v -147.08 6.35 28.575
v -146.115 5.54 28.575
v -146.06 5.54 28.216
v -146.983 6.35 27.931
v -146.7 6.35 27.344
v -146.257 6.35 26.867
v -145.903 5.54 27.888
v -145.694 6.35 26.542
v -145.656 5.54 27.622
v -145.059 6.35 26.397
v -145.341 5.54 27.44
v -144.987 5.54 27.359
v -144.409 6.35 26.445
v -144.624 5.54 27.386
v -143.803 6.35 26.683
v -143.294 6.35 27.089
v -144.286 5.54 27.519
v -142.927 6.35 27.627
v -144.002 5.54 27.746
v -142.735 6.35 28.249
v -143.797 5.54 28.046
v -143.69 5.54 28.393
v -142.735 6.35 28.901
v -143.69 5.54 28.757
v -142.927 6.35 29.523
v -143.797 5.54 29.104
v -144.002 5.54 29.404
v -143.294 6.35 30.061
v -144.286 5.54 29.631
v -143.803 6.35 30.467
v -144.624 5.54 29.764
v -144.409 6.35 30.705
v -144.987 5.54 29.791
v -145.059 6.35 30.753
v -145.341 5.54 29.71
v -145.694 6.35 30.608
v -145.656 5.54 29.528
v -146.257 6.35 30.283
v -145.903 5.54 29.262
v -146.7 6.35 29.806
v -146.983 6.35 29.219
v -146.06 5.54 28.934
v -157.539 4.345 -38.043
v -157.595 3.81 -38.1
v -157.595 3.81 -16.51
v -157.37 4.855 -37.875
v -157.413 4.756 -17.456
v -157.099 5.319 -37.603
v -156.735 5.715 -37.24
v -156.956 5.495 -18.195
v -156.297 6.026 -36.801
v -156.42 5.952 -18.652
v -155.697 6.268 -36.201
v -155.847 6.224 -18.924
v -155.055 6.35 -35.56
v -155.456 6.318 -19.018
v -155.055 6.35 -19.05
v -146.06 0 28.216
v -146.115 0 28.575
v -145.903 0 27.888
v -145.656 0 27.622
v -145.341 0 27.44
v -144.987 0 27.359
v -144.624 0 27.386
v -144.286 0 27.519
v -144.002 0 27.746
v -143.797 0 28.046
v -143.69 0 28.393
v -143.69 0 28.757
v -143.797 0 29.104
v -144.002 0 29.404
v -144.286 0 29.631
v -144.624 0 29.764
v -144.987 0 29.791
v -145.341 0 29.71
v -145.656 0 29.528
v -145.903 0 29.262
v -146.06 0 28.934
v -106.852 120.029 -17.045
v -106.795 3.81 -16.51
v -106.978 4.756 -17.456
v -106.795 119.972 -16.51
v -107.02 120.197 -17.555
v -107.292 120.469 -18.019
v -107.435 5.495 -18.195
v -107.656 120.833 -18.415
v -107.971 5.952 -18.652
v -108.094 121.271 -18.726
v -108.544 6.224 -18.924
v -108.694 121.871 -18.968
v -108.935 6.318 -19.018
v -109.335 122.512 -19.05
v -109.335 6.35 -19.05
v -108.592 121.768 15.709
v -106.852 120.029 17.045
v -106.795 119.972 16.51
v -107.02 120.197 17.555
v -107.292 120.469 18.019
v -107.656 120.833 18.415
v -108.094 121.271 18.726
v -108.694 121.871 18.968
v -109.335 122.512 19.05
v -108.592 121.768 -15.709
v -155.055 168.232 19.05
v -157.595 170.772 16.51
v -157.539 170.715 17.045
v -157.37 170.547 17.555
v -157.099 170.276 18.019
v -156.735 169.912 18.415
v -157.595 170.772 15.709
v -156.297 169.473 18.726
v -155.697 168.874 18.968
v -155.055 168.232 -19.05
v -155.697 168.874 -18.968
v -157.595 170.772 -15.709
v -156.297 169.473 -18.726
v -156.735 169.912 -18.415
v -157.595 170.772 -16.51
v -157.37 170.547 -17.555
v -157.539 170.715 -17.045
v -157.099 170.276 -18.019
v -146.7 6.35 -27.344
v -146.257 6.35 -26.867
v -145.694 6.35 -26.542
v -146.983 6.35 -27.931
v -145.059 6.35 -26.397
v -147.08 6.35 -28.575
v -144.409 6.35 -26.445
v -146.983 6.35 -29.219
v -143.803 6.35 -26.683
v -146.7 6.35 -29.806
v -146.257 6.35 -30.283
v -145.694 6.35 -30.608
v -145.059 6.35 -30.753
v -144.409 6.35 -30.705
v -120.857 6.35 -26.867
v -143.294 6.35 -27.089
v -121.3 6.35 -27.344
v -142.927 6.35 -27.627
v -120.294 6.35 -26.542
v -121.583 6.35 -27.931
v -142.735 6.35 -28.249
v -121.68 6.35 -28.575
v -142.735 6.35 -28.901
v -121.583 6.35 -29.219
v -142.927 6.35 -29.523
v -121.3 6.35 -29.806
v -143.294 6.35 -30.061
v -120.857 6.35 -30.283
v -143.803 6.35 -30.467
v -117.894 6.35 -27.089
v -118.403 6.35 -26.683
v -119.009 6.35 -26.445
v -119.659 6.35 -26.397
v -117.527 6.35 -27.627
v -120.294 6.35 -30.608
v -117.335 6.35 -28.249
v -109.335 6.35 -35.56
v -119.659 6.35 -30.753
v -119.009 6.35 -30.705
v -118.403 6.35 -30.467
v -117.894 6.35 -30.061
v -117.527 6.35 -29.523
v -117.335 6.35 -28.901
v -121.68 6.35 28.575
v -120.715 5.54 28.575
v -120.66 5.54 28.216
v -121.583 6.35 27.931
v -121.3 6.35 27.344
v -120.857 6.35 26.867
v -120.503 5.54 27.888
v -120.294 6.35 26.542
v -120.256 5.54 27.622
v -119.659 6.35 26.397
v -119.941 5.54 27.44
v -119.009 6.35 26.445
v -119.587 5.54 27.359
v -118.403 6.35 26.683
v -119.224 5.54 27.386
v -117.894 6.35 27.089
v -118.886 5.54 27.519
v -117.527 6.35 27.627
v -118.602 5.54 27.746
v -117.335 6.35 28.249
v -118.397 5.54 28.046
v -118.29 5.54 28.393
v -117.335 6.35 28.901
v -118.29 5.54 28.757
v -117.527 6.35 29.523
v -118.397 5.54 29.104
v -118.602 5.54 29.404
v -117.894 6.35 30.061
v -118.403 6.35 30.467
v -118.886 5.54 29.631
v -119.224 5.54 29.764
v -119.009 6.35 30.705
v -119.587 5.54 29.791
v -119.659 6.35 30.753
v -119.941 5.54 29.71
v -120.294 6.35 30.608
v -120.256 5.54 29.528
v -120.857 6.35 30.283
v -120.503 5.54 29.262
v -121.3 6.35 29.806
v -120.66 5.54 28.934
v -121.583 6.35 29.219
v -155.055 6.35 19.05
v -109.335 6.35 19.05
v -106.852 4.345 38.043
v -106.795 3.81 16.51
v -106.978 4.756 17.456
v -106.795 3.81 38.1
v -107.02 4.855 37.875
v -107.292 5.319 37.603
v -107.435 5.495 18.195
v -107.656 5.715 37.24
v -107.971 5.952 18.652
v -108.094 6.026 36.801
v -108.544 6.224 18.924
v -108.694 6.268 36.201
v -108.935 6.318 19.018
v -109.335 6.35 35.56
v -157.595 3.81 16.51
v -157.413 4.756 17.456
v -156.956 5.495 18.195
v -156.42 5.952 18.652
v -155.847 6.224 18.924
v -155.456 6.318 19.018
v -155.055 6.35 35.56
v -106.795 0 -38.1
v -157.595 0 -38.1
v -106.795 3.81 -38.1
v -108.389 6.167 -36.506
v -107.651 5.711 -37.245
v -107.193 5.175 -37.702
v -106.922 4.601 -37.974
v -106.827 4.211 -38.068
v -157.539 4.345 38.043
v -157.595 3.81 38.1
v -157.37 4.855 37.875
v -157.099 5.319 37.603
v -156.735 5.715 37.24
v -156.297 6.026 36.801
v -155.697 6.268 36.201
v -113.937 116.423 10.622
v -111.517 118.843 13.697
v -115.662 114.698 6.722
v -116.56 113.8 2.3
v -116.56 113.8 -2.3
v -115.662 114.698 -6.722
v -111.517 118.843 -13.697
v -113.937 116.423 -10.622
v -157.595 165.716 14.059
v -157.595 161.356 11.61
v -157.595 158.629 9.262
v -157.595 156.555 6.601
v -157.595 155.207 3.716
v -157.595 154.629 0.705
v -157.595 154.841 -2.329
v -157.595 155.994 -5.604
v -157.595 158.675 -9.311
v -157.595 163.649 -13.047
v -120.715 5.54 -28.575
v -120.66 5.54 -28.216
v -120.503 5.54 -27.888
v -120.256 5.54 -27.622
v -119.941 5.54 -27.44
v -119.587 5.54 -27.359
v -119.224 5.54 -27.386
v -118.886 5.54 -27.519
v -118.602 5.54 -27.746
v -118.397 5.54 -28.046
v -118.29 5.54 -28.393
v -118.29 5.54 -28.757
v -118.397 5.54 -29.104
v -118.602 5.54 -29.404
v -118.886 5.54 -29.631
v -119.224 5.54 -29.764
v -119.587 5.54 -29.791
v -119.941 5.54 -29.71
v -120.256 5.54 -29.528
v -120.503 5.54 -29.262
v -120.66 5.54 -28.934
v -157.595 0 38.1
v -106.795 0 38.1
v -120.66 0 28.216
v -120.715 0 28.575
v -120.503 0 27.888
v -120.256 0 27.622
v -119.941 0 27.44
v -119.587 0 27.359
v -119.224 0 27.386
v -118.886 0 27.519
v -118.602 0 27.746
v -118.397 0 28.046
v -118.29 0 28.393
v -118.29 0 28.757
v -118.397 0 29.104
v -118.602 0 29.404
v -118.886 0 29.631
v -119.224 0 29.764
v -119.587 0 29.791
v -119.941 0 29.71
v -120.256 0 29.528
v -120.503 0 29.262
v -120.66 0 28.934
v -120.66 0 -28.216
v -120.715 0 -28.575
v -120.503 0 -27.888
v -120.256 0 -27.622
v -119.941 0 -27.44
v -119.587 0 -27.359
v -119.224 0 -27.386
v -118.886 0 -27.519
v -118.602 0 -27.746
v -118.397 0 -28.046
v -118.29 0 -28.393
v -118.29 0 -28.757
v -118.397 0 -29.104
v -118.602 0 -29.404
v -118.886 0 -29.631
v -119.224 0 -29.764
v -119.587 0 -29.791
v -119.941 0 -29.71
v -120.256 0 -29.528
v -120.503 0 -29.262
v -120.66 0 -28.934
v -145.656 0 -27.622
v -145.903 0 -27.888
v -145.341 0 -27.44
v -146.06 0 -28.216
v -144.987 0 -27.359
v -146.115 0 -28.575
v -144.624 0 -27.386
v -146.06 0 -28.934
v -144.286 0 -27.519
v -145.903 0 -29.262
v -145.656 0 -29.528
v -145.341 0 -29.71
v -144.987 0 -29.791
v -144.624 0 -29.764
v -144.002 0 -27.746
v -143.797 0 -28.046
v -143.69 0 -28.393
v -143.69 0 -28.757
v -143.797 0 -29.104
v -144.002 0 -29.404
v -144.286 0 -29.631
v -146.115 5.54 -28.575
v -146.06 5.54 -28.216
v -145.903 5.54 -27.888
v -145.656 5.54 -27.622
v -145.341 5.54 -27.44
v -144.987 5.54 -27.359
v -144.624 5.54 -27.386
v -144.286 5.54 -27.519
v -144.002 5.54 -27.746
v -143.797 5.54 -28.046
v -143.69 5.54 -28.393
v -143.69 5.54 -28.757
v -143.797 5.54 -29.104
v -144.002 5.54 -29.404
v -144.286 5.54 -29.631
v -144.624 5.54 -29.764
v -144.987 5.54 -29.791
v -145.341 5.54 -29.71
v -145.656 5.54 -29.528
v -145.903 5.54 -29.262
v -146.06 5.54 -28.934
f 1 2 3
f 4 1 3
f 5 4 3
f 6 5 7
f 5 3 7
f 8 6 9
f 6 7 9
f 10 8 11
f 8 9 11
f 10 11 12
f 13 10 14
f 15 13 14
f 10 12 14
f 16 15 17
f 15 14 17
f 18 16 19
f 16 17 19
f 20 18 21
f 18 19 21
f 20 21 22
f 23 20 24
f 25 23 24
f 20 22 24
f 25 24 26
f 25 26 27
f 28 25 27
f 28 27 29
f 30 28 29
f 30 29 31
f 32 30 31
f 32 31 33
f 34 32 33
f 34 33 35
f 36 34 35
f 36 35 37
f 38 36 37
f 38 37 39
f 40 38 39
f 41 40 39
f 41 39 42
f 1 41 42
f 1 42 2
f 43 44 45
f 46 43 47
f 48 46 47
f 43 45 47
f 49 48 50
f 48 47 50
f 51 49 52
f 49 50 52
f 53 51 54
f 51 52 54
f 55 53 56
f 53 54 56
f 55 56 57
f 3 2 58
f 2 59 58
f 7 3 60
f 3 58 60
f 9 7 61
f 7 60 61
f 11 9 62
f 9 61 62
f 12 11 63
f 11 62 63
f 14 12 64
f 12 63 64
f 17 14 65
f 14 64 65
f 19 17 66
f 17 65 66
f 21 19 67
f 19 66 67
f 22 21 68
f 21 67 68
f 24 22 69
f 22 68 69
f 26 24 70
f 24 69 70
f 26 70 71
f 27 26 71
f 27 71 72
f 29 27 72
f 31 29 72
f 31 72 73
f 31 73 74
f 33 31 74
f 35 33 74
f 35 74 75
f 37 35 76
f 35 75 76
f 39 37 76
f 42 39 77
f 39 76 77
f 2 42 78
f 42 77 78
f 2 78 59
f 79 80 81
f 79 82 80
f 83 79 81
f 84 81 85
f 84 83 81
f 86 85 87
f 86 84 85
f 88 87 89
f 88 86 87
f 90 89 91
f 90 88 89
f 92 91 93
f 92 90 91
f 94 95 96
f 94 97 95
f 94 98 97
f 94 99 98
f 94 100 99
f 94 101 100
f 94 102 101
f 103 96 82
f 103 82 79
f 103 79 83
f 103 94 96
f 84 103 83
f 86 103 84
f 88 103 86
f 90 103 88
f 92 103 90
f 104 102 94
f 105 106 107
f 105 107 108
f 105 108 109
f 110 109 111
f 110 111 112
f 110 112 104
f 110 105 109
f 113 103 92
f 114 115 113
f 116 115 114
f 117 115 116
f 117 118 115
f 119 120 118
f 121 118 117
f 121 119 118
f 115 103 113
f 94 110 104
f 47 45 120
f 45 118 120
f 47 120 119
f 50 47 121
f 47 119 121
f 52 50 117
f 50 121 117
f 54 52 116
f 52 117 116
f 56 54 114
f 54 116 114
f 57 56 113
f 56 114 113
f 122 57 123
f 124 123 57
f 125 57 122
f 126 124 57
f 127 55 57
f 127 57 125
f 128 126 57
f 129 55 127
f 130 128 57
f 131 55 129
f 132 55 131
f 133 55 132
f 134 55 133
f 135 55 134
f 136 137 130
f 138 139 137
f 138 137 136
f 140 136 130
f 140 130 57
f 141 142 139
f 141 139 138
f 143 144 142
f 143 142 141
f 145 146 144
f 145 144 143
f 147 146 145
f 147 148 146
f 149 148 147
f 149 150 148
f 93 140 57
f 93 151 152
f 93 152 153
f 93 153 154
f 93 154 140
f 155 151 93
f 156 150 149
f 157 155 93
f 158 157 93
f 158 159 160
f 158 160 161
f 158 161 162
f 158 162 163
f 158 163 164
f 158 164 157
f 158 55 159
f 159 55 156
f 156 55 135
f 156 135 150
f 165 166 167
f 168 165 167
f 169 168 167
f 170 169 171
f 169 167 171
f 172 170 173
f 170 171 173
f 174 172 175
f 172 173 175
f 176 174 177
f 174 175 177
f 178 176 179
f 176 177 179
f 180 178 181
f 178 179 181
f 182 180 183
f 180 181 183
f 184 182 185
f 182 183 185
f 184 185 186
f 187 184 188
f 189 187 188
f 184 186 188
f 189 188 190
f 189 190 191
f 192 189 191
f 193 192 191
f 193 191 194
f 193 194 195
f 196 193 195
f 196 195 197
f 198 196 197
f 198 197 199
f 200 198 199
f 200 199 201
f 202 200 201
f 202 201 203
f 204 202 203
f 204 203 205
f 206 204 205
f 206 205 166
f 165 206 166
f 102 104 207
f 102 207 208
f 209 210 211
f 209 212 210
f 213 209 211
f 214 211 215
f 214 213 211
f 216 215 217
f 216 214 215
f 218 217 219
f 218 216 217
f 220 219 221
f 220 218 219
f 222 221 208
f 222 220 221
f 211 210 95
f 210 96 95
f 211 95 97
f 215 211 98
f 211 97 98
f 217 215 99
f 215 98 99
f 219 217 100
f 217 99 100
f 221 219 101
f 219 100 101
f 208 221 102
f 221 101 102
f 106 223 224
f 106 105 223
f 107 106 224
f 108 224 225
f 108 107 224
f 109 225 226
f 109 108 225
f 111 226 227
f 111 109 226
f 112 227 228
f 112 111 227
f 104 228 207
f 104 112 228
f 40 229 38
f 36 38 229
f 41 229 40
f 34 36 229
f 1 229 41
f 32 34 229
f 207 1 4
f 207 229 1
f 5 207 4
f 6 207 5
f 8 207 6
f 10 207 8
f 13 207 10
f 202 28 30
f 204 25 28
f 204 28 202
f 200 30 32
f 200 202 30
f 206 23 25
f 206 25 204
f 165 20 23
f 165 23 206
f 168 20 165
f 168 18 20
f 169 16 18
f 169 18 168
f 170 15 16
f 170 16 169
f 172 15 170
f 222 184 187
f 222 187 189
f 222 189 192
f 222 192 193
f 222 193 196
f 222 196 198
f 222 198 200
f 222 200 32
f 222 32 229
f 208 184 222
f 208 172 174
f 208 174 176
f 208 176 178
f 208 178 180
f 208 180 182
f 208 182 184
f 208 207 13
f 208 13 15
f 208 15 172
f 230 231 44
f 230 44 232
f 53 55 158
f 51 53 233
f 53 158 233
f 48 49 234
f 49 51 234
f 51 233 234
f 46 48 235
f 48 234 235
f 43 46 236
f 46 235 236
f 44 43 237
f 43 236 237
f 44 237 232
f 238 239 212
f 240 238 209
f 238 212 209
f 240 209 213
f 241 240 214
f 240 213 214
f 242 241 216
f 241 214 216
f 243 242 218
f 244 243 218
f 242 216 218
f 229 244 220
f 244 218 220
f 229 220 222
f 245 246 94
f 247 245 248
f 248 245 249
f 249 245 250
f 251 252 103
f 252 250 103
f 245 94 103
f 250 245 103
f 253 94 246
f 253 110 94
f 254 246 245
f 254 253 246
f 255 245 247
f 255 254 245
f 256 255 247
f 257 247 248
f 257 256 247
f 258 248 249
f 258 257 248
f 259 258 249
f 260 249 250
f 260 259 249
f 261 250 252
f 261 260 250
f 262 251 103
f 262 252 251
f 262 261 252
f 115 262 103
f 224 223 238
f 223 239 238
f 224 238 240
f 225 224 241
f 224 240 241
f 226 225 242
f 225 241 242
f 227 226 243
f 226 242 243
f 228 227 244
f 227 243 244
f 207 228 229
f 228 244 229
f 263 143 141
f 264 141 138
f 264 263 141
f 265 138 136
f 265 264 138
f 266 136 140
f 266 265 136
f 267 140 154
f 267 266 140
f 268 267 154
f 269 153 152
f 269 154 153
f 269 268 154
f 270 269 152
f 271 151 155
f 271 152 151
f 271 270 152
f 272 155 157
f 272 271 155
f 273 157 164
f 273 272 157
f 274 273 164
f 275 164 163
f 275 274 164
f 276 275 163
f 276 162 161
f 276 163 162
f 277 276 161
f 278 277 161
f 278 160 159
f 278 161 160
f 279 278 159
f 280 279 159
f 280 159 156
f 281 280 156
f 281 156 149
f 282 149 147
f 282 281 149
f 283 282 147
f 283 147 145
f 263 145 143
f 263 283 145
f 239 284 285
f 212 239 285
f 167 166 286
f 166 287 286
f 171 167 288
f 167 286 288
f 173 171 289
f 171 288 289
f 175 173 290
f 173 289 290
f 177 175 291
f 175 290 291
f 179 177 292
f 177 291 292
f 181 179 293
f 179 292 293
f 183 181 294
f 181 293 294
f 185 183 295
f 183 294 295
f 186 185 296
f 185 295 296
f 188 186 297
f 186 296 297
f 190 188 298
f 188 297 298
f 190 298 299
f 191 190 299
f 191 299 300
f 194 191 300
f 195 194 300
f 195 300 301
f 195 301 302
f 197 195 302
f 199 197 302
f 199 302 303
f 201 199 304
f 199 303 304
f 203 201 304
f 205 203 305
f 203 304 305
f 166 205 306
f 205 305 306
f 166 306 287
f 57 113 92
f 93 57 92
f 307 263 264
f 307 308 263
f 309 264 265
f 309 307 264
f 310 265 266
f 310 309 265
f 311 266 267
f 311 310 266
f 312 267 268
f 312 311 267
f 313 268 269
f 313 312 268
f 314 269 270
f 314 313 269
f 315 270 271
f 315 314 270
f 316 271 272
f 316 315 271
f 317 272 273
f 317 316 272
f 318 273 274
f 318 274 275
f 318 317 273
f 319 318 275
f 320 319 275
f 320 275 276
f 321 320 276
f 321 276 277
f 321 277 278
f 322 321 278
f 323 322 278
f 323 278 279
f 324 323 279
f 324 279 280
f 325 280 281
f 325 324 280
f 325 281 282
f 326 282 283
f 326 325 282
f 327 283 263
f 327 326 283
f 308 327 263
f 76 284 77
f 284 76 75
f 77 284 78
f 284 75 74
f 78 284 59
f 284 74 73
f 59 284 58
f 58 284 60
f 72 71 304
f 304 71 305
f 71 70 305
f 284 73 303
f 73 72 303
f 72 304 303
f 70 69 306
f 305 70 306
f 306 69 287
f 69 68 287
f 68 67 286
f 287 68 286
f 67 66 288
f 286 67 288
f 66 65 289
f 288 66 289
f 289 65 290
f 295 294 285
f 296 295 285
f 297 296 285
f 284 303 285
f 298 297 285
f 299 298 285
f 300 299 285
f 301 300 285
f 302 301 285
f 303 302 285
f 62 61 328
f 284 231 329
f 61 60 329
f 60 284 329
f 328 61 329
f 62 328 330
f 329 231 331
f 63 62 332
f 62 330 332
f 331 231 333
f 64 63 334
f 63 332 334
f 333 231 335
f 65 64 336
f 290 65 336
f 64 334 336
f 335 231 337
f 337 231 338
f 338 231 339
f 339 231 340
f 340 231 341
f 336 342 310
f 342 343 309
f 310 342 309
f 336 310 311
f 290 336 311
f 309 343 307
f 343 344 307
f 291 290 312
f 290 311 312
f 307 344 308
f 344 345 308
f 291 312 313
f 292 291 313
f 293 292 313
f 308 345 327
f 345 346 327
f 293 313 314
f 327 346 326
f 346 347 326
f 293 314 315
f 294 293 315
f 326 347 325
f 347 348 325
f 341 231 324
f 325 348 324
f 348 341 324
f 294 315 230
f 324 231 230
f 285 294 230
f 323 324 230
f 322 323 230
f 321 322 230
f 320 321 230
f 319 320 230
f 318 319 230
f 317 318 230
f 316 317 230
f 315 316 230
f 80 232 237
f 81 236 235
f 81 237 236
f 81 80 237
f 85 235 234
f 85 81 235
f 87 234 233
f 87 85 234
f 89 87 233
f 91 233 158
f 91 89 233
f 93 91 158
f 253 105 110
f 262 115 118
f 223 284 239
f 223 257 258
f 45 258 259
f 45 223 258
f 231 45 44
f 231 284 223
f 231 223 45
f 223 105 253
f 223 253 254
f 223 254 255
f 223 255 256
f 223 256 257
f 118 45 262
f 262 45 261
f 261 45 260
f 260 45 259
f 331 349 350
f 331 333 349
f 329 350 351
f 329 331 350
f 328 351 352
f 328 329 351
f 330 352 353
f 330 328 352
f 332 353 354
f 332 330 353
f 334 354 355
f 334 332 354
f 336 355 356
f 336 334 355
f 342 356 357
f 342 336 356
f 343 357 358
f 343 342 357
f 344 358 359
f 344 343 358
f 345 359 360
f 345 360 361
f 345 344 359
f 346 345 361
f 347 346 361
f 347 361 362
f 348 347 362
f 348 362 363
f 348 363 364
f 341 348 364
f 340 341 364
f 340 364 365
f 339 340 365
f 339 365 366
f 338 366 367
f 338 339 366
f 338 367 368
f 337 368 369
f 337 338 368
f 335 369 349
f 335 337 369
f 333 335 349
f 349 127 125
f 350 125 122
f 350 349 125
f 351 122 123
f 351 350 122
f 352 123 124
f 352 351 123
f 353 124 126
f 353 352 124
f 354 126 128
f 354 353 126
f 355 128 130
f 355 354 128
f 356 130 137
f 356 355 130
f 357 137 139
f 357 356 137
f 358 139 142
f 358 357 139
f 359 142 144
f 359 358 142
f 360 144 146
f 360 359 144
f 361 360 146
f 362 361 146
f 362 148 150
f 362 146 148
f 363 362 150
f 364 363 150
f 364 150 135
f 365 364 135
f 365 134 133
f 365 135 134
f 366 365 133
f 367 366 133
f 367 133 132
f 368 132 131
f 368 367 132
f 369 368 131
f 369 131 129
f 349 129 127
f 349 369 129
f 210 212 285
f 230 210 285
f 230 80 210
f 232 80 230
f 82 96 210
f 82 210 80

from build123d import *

# Parameters (mm, degrees)
SKETCH1_W                                         = 50.8
SKETCH1_H                                         = 76.2
BOSS_EXTRUDE1_DEPTH                               = 6.35
SKETCH2_W                                         = 50.8
SKETCH2_H                                         = 38.1
BOSS_EXTRUDE2_DEPTH                               = 171.6066
CUT_EXTRUDE1_DEPTH                                = 183.535025619
CUT_EXTRUDE1_DEPTH_BACK                           = 183.535025619
BOSS_EXTRUDE3_REACH                               = 237.296
SKETCH20_W                                        = 38.1
SKETCH20_H                                        = 2.54
BOSS_EXTRUDE4_REACH                               = 129.523
CSK_FOR_2_FLAT_HEAD_MACHINE_SCREW_100_D           = 2.4384
CSK_FOR_2_FLAT_HEAD_MACHINE_SCREW_100_CSINK_D     = 4.3688
CSK_FOR_2_FLAT_HEAD_MACHINE_SCREW_100_CSINK_ANGLE = 100
FILLET1_R                                         = 2.54
FILLET2_R                                         = 2.54


with BuildPart() as part:
    # Sketch1 → Boss-Extrude1 (new body)
    with BuildSketch(Plane(origin=(0, 0, 0), x_dir=(1, 0, 0), z_dir=(0, 1, 0))):
        with Locations((-132.195454545, 0)):
            Rectangle(SKETCH1_W, SKETCH1_H)
    extrude(amount=BOSS_EXTRUDE1_DEPTH)

    # Sketch2 → Boss-Extrude2 (add)
    with BuildSketch(Plane(origin=(0, 6.35, 0), x_dir=(1, 0, 0), z_dir=(0, 1, 0))):
        with Locations((-132.195454545, 0)):
            Rectangle(SKETCH2_W, SKETCH2_H)
    extrude(amount=BOSS_EXTRUDE2_DEPTH)

    # Sketch19 → Cut-Extrude1 (cut, two sides: drawn at the far end of the back side and taken through both)
    with BuildSketch(Plane(origin=(-167.776027273, 167.776027273, 0), x_dir=(-0.7071067811865488, -0.7071067811865462, 0), z_dir=(0.7071067811865462, -0.7071067811865488, 0)).offset(-CUT_EXTRUDE1_DEPTH_BACK)):
        with BuildLine():
            Line((-14.397504024, 16.51), (-14.397504024, -16.51))
            ThreePointArc((-14.397504024, -16.51), (2.112495976, 0), (-14.397504024, 16.51))
        make_face()
    extrude(amount=CUT_EXTRUDE1_DEPTH + CUT_EXTRUDE1_DEPTH_BACK, mode=Mode.SUBTRACT)

    # SurfaceCut1
    split(bisect_by=Plane(origin=(6.588470279, 6.588470279, 0), x_dir=(0, 0, 1), z_dir=(-0.7071067811865488, -0.7071067811865464, 0)), keep=Keep.TOP)

    # Sketch20 → Boss-Extrude3 (add, up to next)
    with BuildSketch(Plane(origin=(6.588470279, 6.588470279, 0), x_dir=(0, 0, -1), z_dir=(0.7071067811865487, 0.7071067811865465, 0)), mode=Mode.PRIVATE) as boss_extrude3_sk1:
        with Locations((0, 161.619084242)):
            Rectangle(SKETCH20_W, SKETCH20_H)
    boss_extrude3_tool1 = extrude(boss_extrude3_sk1.sketch, amount=-BOSS_EXTRUDE3_REACH, mode=Mode.PRIVATE) - part.part
    add(boss_extrude3_tool1.solids().sort_by_distance((-107.69348, 120.870421, 0))[0])

    # Boss-Extrude4: up to this face of the body (flat: up to its plane)
    boss_extrude4_end = Plane(part.part.faces().sort_by_distance((-106.795454545, 52.426789341, 0))[0])
    # Sketch22 → Boss-Extrude4 (add, up to the picked face)
    with BuildSketch(Plane(origin=(-113.383924824, 113.383924824, 0), x_dir=(0, 0, -1), z_dir=(0.7071067811865465, -0.7071067811865486, 0)), mode=Mode.PRIVATE) as boss_extrude4_sk1:
        with BuildLine():
            Line((-15.709032434, 9.317504024), (15.709032434, 9.317504024))
            ThreePointArc((15.709032434, 9.317504024), (0, -6.39152841), (-15.709032434, 9.317504024))
        make_face()
    boss_extrude4_tool1 = split(extrude(boss_extrude4_sk1.sketch, amount=BOSS_EXTRUDE4_REACH, mode=Mode.PRIVATE), bisect_by=boss_extrude4_end, keep=Keep.BOTH, mode=Mode.PRIVATE)
    add(boss_extrude4_tool1.solids().sort_by(Axis((-111.509821, 115.258029, 0), (0.7071067811865465, -0.7071067811865486, 0)))[0])

    # CSK for #2 Flat Head Machine Screw (100)1 (through all)
    with Locations(Plane(origin=(0, 6.35, 0), x_dir=(1, 0, 0), z_dir=(0, 1, 0))):
        with Locations((-144.895454545, -28.575), (-119.495454545, -28.575)):
            csk_for_2_flat_head_machine_screw_100 = CounterSinkHole(CSK_FOR_2_FLAT_HEAD_MACHINE_SCREW_100_D / 2, CSK_FOR_2_FLAT_HEAD_MACHINE_SCREW_100_CSINK_D / 2, counter_sink_angle=CSK_FOR_2_FLAT_HEAD_MACHINE_SCREW_100_CSINK_ANGLE)

    # Mirror1: CSK for #2 Flat Head Machine Screw (100)1 across plane
    add(csk_for_2_flat_head_machine_screw_100.mirror(Plane.XY), mode=Mode.SUBTRACT)

    # Fillet1
    fillet1_edges = [part.edges().sort_by_distance(p)[0] for p in [
        (-157.595454545, 88.561197552, 19.05),
        (-106.795454545, 63.161197552, 19.05),
        (-106.795454545, 63.161197552, -19.05),
        (-157.595454545, 88.561197552, -19.05),
    ]]
    fillet(fillet1_edges, radius=FILLET1_R)

    # Fillet2
    fillet2_edges = [part.edges().sort_by_distance(p)[0] for p in [
        (-157.595454545, 6.35, -27.305),
        (-132.195454545, 6.35, -38.1),
        (-106.795454545, 6.35, -27.305),
        (-157.595454545, 6.35, 27.305),
        (-132.195454545, 6.35, 38.1),
        (-106.795454545, 6.35, 27.305),
    ]]
    fillet(fillet2_edges, radius=FILLET2_R)


solid = part.part
